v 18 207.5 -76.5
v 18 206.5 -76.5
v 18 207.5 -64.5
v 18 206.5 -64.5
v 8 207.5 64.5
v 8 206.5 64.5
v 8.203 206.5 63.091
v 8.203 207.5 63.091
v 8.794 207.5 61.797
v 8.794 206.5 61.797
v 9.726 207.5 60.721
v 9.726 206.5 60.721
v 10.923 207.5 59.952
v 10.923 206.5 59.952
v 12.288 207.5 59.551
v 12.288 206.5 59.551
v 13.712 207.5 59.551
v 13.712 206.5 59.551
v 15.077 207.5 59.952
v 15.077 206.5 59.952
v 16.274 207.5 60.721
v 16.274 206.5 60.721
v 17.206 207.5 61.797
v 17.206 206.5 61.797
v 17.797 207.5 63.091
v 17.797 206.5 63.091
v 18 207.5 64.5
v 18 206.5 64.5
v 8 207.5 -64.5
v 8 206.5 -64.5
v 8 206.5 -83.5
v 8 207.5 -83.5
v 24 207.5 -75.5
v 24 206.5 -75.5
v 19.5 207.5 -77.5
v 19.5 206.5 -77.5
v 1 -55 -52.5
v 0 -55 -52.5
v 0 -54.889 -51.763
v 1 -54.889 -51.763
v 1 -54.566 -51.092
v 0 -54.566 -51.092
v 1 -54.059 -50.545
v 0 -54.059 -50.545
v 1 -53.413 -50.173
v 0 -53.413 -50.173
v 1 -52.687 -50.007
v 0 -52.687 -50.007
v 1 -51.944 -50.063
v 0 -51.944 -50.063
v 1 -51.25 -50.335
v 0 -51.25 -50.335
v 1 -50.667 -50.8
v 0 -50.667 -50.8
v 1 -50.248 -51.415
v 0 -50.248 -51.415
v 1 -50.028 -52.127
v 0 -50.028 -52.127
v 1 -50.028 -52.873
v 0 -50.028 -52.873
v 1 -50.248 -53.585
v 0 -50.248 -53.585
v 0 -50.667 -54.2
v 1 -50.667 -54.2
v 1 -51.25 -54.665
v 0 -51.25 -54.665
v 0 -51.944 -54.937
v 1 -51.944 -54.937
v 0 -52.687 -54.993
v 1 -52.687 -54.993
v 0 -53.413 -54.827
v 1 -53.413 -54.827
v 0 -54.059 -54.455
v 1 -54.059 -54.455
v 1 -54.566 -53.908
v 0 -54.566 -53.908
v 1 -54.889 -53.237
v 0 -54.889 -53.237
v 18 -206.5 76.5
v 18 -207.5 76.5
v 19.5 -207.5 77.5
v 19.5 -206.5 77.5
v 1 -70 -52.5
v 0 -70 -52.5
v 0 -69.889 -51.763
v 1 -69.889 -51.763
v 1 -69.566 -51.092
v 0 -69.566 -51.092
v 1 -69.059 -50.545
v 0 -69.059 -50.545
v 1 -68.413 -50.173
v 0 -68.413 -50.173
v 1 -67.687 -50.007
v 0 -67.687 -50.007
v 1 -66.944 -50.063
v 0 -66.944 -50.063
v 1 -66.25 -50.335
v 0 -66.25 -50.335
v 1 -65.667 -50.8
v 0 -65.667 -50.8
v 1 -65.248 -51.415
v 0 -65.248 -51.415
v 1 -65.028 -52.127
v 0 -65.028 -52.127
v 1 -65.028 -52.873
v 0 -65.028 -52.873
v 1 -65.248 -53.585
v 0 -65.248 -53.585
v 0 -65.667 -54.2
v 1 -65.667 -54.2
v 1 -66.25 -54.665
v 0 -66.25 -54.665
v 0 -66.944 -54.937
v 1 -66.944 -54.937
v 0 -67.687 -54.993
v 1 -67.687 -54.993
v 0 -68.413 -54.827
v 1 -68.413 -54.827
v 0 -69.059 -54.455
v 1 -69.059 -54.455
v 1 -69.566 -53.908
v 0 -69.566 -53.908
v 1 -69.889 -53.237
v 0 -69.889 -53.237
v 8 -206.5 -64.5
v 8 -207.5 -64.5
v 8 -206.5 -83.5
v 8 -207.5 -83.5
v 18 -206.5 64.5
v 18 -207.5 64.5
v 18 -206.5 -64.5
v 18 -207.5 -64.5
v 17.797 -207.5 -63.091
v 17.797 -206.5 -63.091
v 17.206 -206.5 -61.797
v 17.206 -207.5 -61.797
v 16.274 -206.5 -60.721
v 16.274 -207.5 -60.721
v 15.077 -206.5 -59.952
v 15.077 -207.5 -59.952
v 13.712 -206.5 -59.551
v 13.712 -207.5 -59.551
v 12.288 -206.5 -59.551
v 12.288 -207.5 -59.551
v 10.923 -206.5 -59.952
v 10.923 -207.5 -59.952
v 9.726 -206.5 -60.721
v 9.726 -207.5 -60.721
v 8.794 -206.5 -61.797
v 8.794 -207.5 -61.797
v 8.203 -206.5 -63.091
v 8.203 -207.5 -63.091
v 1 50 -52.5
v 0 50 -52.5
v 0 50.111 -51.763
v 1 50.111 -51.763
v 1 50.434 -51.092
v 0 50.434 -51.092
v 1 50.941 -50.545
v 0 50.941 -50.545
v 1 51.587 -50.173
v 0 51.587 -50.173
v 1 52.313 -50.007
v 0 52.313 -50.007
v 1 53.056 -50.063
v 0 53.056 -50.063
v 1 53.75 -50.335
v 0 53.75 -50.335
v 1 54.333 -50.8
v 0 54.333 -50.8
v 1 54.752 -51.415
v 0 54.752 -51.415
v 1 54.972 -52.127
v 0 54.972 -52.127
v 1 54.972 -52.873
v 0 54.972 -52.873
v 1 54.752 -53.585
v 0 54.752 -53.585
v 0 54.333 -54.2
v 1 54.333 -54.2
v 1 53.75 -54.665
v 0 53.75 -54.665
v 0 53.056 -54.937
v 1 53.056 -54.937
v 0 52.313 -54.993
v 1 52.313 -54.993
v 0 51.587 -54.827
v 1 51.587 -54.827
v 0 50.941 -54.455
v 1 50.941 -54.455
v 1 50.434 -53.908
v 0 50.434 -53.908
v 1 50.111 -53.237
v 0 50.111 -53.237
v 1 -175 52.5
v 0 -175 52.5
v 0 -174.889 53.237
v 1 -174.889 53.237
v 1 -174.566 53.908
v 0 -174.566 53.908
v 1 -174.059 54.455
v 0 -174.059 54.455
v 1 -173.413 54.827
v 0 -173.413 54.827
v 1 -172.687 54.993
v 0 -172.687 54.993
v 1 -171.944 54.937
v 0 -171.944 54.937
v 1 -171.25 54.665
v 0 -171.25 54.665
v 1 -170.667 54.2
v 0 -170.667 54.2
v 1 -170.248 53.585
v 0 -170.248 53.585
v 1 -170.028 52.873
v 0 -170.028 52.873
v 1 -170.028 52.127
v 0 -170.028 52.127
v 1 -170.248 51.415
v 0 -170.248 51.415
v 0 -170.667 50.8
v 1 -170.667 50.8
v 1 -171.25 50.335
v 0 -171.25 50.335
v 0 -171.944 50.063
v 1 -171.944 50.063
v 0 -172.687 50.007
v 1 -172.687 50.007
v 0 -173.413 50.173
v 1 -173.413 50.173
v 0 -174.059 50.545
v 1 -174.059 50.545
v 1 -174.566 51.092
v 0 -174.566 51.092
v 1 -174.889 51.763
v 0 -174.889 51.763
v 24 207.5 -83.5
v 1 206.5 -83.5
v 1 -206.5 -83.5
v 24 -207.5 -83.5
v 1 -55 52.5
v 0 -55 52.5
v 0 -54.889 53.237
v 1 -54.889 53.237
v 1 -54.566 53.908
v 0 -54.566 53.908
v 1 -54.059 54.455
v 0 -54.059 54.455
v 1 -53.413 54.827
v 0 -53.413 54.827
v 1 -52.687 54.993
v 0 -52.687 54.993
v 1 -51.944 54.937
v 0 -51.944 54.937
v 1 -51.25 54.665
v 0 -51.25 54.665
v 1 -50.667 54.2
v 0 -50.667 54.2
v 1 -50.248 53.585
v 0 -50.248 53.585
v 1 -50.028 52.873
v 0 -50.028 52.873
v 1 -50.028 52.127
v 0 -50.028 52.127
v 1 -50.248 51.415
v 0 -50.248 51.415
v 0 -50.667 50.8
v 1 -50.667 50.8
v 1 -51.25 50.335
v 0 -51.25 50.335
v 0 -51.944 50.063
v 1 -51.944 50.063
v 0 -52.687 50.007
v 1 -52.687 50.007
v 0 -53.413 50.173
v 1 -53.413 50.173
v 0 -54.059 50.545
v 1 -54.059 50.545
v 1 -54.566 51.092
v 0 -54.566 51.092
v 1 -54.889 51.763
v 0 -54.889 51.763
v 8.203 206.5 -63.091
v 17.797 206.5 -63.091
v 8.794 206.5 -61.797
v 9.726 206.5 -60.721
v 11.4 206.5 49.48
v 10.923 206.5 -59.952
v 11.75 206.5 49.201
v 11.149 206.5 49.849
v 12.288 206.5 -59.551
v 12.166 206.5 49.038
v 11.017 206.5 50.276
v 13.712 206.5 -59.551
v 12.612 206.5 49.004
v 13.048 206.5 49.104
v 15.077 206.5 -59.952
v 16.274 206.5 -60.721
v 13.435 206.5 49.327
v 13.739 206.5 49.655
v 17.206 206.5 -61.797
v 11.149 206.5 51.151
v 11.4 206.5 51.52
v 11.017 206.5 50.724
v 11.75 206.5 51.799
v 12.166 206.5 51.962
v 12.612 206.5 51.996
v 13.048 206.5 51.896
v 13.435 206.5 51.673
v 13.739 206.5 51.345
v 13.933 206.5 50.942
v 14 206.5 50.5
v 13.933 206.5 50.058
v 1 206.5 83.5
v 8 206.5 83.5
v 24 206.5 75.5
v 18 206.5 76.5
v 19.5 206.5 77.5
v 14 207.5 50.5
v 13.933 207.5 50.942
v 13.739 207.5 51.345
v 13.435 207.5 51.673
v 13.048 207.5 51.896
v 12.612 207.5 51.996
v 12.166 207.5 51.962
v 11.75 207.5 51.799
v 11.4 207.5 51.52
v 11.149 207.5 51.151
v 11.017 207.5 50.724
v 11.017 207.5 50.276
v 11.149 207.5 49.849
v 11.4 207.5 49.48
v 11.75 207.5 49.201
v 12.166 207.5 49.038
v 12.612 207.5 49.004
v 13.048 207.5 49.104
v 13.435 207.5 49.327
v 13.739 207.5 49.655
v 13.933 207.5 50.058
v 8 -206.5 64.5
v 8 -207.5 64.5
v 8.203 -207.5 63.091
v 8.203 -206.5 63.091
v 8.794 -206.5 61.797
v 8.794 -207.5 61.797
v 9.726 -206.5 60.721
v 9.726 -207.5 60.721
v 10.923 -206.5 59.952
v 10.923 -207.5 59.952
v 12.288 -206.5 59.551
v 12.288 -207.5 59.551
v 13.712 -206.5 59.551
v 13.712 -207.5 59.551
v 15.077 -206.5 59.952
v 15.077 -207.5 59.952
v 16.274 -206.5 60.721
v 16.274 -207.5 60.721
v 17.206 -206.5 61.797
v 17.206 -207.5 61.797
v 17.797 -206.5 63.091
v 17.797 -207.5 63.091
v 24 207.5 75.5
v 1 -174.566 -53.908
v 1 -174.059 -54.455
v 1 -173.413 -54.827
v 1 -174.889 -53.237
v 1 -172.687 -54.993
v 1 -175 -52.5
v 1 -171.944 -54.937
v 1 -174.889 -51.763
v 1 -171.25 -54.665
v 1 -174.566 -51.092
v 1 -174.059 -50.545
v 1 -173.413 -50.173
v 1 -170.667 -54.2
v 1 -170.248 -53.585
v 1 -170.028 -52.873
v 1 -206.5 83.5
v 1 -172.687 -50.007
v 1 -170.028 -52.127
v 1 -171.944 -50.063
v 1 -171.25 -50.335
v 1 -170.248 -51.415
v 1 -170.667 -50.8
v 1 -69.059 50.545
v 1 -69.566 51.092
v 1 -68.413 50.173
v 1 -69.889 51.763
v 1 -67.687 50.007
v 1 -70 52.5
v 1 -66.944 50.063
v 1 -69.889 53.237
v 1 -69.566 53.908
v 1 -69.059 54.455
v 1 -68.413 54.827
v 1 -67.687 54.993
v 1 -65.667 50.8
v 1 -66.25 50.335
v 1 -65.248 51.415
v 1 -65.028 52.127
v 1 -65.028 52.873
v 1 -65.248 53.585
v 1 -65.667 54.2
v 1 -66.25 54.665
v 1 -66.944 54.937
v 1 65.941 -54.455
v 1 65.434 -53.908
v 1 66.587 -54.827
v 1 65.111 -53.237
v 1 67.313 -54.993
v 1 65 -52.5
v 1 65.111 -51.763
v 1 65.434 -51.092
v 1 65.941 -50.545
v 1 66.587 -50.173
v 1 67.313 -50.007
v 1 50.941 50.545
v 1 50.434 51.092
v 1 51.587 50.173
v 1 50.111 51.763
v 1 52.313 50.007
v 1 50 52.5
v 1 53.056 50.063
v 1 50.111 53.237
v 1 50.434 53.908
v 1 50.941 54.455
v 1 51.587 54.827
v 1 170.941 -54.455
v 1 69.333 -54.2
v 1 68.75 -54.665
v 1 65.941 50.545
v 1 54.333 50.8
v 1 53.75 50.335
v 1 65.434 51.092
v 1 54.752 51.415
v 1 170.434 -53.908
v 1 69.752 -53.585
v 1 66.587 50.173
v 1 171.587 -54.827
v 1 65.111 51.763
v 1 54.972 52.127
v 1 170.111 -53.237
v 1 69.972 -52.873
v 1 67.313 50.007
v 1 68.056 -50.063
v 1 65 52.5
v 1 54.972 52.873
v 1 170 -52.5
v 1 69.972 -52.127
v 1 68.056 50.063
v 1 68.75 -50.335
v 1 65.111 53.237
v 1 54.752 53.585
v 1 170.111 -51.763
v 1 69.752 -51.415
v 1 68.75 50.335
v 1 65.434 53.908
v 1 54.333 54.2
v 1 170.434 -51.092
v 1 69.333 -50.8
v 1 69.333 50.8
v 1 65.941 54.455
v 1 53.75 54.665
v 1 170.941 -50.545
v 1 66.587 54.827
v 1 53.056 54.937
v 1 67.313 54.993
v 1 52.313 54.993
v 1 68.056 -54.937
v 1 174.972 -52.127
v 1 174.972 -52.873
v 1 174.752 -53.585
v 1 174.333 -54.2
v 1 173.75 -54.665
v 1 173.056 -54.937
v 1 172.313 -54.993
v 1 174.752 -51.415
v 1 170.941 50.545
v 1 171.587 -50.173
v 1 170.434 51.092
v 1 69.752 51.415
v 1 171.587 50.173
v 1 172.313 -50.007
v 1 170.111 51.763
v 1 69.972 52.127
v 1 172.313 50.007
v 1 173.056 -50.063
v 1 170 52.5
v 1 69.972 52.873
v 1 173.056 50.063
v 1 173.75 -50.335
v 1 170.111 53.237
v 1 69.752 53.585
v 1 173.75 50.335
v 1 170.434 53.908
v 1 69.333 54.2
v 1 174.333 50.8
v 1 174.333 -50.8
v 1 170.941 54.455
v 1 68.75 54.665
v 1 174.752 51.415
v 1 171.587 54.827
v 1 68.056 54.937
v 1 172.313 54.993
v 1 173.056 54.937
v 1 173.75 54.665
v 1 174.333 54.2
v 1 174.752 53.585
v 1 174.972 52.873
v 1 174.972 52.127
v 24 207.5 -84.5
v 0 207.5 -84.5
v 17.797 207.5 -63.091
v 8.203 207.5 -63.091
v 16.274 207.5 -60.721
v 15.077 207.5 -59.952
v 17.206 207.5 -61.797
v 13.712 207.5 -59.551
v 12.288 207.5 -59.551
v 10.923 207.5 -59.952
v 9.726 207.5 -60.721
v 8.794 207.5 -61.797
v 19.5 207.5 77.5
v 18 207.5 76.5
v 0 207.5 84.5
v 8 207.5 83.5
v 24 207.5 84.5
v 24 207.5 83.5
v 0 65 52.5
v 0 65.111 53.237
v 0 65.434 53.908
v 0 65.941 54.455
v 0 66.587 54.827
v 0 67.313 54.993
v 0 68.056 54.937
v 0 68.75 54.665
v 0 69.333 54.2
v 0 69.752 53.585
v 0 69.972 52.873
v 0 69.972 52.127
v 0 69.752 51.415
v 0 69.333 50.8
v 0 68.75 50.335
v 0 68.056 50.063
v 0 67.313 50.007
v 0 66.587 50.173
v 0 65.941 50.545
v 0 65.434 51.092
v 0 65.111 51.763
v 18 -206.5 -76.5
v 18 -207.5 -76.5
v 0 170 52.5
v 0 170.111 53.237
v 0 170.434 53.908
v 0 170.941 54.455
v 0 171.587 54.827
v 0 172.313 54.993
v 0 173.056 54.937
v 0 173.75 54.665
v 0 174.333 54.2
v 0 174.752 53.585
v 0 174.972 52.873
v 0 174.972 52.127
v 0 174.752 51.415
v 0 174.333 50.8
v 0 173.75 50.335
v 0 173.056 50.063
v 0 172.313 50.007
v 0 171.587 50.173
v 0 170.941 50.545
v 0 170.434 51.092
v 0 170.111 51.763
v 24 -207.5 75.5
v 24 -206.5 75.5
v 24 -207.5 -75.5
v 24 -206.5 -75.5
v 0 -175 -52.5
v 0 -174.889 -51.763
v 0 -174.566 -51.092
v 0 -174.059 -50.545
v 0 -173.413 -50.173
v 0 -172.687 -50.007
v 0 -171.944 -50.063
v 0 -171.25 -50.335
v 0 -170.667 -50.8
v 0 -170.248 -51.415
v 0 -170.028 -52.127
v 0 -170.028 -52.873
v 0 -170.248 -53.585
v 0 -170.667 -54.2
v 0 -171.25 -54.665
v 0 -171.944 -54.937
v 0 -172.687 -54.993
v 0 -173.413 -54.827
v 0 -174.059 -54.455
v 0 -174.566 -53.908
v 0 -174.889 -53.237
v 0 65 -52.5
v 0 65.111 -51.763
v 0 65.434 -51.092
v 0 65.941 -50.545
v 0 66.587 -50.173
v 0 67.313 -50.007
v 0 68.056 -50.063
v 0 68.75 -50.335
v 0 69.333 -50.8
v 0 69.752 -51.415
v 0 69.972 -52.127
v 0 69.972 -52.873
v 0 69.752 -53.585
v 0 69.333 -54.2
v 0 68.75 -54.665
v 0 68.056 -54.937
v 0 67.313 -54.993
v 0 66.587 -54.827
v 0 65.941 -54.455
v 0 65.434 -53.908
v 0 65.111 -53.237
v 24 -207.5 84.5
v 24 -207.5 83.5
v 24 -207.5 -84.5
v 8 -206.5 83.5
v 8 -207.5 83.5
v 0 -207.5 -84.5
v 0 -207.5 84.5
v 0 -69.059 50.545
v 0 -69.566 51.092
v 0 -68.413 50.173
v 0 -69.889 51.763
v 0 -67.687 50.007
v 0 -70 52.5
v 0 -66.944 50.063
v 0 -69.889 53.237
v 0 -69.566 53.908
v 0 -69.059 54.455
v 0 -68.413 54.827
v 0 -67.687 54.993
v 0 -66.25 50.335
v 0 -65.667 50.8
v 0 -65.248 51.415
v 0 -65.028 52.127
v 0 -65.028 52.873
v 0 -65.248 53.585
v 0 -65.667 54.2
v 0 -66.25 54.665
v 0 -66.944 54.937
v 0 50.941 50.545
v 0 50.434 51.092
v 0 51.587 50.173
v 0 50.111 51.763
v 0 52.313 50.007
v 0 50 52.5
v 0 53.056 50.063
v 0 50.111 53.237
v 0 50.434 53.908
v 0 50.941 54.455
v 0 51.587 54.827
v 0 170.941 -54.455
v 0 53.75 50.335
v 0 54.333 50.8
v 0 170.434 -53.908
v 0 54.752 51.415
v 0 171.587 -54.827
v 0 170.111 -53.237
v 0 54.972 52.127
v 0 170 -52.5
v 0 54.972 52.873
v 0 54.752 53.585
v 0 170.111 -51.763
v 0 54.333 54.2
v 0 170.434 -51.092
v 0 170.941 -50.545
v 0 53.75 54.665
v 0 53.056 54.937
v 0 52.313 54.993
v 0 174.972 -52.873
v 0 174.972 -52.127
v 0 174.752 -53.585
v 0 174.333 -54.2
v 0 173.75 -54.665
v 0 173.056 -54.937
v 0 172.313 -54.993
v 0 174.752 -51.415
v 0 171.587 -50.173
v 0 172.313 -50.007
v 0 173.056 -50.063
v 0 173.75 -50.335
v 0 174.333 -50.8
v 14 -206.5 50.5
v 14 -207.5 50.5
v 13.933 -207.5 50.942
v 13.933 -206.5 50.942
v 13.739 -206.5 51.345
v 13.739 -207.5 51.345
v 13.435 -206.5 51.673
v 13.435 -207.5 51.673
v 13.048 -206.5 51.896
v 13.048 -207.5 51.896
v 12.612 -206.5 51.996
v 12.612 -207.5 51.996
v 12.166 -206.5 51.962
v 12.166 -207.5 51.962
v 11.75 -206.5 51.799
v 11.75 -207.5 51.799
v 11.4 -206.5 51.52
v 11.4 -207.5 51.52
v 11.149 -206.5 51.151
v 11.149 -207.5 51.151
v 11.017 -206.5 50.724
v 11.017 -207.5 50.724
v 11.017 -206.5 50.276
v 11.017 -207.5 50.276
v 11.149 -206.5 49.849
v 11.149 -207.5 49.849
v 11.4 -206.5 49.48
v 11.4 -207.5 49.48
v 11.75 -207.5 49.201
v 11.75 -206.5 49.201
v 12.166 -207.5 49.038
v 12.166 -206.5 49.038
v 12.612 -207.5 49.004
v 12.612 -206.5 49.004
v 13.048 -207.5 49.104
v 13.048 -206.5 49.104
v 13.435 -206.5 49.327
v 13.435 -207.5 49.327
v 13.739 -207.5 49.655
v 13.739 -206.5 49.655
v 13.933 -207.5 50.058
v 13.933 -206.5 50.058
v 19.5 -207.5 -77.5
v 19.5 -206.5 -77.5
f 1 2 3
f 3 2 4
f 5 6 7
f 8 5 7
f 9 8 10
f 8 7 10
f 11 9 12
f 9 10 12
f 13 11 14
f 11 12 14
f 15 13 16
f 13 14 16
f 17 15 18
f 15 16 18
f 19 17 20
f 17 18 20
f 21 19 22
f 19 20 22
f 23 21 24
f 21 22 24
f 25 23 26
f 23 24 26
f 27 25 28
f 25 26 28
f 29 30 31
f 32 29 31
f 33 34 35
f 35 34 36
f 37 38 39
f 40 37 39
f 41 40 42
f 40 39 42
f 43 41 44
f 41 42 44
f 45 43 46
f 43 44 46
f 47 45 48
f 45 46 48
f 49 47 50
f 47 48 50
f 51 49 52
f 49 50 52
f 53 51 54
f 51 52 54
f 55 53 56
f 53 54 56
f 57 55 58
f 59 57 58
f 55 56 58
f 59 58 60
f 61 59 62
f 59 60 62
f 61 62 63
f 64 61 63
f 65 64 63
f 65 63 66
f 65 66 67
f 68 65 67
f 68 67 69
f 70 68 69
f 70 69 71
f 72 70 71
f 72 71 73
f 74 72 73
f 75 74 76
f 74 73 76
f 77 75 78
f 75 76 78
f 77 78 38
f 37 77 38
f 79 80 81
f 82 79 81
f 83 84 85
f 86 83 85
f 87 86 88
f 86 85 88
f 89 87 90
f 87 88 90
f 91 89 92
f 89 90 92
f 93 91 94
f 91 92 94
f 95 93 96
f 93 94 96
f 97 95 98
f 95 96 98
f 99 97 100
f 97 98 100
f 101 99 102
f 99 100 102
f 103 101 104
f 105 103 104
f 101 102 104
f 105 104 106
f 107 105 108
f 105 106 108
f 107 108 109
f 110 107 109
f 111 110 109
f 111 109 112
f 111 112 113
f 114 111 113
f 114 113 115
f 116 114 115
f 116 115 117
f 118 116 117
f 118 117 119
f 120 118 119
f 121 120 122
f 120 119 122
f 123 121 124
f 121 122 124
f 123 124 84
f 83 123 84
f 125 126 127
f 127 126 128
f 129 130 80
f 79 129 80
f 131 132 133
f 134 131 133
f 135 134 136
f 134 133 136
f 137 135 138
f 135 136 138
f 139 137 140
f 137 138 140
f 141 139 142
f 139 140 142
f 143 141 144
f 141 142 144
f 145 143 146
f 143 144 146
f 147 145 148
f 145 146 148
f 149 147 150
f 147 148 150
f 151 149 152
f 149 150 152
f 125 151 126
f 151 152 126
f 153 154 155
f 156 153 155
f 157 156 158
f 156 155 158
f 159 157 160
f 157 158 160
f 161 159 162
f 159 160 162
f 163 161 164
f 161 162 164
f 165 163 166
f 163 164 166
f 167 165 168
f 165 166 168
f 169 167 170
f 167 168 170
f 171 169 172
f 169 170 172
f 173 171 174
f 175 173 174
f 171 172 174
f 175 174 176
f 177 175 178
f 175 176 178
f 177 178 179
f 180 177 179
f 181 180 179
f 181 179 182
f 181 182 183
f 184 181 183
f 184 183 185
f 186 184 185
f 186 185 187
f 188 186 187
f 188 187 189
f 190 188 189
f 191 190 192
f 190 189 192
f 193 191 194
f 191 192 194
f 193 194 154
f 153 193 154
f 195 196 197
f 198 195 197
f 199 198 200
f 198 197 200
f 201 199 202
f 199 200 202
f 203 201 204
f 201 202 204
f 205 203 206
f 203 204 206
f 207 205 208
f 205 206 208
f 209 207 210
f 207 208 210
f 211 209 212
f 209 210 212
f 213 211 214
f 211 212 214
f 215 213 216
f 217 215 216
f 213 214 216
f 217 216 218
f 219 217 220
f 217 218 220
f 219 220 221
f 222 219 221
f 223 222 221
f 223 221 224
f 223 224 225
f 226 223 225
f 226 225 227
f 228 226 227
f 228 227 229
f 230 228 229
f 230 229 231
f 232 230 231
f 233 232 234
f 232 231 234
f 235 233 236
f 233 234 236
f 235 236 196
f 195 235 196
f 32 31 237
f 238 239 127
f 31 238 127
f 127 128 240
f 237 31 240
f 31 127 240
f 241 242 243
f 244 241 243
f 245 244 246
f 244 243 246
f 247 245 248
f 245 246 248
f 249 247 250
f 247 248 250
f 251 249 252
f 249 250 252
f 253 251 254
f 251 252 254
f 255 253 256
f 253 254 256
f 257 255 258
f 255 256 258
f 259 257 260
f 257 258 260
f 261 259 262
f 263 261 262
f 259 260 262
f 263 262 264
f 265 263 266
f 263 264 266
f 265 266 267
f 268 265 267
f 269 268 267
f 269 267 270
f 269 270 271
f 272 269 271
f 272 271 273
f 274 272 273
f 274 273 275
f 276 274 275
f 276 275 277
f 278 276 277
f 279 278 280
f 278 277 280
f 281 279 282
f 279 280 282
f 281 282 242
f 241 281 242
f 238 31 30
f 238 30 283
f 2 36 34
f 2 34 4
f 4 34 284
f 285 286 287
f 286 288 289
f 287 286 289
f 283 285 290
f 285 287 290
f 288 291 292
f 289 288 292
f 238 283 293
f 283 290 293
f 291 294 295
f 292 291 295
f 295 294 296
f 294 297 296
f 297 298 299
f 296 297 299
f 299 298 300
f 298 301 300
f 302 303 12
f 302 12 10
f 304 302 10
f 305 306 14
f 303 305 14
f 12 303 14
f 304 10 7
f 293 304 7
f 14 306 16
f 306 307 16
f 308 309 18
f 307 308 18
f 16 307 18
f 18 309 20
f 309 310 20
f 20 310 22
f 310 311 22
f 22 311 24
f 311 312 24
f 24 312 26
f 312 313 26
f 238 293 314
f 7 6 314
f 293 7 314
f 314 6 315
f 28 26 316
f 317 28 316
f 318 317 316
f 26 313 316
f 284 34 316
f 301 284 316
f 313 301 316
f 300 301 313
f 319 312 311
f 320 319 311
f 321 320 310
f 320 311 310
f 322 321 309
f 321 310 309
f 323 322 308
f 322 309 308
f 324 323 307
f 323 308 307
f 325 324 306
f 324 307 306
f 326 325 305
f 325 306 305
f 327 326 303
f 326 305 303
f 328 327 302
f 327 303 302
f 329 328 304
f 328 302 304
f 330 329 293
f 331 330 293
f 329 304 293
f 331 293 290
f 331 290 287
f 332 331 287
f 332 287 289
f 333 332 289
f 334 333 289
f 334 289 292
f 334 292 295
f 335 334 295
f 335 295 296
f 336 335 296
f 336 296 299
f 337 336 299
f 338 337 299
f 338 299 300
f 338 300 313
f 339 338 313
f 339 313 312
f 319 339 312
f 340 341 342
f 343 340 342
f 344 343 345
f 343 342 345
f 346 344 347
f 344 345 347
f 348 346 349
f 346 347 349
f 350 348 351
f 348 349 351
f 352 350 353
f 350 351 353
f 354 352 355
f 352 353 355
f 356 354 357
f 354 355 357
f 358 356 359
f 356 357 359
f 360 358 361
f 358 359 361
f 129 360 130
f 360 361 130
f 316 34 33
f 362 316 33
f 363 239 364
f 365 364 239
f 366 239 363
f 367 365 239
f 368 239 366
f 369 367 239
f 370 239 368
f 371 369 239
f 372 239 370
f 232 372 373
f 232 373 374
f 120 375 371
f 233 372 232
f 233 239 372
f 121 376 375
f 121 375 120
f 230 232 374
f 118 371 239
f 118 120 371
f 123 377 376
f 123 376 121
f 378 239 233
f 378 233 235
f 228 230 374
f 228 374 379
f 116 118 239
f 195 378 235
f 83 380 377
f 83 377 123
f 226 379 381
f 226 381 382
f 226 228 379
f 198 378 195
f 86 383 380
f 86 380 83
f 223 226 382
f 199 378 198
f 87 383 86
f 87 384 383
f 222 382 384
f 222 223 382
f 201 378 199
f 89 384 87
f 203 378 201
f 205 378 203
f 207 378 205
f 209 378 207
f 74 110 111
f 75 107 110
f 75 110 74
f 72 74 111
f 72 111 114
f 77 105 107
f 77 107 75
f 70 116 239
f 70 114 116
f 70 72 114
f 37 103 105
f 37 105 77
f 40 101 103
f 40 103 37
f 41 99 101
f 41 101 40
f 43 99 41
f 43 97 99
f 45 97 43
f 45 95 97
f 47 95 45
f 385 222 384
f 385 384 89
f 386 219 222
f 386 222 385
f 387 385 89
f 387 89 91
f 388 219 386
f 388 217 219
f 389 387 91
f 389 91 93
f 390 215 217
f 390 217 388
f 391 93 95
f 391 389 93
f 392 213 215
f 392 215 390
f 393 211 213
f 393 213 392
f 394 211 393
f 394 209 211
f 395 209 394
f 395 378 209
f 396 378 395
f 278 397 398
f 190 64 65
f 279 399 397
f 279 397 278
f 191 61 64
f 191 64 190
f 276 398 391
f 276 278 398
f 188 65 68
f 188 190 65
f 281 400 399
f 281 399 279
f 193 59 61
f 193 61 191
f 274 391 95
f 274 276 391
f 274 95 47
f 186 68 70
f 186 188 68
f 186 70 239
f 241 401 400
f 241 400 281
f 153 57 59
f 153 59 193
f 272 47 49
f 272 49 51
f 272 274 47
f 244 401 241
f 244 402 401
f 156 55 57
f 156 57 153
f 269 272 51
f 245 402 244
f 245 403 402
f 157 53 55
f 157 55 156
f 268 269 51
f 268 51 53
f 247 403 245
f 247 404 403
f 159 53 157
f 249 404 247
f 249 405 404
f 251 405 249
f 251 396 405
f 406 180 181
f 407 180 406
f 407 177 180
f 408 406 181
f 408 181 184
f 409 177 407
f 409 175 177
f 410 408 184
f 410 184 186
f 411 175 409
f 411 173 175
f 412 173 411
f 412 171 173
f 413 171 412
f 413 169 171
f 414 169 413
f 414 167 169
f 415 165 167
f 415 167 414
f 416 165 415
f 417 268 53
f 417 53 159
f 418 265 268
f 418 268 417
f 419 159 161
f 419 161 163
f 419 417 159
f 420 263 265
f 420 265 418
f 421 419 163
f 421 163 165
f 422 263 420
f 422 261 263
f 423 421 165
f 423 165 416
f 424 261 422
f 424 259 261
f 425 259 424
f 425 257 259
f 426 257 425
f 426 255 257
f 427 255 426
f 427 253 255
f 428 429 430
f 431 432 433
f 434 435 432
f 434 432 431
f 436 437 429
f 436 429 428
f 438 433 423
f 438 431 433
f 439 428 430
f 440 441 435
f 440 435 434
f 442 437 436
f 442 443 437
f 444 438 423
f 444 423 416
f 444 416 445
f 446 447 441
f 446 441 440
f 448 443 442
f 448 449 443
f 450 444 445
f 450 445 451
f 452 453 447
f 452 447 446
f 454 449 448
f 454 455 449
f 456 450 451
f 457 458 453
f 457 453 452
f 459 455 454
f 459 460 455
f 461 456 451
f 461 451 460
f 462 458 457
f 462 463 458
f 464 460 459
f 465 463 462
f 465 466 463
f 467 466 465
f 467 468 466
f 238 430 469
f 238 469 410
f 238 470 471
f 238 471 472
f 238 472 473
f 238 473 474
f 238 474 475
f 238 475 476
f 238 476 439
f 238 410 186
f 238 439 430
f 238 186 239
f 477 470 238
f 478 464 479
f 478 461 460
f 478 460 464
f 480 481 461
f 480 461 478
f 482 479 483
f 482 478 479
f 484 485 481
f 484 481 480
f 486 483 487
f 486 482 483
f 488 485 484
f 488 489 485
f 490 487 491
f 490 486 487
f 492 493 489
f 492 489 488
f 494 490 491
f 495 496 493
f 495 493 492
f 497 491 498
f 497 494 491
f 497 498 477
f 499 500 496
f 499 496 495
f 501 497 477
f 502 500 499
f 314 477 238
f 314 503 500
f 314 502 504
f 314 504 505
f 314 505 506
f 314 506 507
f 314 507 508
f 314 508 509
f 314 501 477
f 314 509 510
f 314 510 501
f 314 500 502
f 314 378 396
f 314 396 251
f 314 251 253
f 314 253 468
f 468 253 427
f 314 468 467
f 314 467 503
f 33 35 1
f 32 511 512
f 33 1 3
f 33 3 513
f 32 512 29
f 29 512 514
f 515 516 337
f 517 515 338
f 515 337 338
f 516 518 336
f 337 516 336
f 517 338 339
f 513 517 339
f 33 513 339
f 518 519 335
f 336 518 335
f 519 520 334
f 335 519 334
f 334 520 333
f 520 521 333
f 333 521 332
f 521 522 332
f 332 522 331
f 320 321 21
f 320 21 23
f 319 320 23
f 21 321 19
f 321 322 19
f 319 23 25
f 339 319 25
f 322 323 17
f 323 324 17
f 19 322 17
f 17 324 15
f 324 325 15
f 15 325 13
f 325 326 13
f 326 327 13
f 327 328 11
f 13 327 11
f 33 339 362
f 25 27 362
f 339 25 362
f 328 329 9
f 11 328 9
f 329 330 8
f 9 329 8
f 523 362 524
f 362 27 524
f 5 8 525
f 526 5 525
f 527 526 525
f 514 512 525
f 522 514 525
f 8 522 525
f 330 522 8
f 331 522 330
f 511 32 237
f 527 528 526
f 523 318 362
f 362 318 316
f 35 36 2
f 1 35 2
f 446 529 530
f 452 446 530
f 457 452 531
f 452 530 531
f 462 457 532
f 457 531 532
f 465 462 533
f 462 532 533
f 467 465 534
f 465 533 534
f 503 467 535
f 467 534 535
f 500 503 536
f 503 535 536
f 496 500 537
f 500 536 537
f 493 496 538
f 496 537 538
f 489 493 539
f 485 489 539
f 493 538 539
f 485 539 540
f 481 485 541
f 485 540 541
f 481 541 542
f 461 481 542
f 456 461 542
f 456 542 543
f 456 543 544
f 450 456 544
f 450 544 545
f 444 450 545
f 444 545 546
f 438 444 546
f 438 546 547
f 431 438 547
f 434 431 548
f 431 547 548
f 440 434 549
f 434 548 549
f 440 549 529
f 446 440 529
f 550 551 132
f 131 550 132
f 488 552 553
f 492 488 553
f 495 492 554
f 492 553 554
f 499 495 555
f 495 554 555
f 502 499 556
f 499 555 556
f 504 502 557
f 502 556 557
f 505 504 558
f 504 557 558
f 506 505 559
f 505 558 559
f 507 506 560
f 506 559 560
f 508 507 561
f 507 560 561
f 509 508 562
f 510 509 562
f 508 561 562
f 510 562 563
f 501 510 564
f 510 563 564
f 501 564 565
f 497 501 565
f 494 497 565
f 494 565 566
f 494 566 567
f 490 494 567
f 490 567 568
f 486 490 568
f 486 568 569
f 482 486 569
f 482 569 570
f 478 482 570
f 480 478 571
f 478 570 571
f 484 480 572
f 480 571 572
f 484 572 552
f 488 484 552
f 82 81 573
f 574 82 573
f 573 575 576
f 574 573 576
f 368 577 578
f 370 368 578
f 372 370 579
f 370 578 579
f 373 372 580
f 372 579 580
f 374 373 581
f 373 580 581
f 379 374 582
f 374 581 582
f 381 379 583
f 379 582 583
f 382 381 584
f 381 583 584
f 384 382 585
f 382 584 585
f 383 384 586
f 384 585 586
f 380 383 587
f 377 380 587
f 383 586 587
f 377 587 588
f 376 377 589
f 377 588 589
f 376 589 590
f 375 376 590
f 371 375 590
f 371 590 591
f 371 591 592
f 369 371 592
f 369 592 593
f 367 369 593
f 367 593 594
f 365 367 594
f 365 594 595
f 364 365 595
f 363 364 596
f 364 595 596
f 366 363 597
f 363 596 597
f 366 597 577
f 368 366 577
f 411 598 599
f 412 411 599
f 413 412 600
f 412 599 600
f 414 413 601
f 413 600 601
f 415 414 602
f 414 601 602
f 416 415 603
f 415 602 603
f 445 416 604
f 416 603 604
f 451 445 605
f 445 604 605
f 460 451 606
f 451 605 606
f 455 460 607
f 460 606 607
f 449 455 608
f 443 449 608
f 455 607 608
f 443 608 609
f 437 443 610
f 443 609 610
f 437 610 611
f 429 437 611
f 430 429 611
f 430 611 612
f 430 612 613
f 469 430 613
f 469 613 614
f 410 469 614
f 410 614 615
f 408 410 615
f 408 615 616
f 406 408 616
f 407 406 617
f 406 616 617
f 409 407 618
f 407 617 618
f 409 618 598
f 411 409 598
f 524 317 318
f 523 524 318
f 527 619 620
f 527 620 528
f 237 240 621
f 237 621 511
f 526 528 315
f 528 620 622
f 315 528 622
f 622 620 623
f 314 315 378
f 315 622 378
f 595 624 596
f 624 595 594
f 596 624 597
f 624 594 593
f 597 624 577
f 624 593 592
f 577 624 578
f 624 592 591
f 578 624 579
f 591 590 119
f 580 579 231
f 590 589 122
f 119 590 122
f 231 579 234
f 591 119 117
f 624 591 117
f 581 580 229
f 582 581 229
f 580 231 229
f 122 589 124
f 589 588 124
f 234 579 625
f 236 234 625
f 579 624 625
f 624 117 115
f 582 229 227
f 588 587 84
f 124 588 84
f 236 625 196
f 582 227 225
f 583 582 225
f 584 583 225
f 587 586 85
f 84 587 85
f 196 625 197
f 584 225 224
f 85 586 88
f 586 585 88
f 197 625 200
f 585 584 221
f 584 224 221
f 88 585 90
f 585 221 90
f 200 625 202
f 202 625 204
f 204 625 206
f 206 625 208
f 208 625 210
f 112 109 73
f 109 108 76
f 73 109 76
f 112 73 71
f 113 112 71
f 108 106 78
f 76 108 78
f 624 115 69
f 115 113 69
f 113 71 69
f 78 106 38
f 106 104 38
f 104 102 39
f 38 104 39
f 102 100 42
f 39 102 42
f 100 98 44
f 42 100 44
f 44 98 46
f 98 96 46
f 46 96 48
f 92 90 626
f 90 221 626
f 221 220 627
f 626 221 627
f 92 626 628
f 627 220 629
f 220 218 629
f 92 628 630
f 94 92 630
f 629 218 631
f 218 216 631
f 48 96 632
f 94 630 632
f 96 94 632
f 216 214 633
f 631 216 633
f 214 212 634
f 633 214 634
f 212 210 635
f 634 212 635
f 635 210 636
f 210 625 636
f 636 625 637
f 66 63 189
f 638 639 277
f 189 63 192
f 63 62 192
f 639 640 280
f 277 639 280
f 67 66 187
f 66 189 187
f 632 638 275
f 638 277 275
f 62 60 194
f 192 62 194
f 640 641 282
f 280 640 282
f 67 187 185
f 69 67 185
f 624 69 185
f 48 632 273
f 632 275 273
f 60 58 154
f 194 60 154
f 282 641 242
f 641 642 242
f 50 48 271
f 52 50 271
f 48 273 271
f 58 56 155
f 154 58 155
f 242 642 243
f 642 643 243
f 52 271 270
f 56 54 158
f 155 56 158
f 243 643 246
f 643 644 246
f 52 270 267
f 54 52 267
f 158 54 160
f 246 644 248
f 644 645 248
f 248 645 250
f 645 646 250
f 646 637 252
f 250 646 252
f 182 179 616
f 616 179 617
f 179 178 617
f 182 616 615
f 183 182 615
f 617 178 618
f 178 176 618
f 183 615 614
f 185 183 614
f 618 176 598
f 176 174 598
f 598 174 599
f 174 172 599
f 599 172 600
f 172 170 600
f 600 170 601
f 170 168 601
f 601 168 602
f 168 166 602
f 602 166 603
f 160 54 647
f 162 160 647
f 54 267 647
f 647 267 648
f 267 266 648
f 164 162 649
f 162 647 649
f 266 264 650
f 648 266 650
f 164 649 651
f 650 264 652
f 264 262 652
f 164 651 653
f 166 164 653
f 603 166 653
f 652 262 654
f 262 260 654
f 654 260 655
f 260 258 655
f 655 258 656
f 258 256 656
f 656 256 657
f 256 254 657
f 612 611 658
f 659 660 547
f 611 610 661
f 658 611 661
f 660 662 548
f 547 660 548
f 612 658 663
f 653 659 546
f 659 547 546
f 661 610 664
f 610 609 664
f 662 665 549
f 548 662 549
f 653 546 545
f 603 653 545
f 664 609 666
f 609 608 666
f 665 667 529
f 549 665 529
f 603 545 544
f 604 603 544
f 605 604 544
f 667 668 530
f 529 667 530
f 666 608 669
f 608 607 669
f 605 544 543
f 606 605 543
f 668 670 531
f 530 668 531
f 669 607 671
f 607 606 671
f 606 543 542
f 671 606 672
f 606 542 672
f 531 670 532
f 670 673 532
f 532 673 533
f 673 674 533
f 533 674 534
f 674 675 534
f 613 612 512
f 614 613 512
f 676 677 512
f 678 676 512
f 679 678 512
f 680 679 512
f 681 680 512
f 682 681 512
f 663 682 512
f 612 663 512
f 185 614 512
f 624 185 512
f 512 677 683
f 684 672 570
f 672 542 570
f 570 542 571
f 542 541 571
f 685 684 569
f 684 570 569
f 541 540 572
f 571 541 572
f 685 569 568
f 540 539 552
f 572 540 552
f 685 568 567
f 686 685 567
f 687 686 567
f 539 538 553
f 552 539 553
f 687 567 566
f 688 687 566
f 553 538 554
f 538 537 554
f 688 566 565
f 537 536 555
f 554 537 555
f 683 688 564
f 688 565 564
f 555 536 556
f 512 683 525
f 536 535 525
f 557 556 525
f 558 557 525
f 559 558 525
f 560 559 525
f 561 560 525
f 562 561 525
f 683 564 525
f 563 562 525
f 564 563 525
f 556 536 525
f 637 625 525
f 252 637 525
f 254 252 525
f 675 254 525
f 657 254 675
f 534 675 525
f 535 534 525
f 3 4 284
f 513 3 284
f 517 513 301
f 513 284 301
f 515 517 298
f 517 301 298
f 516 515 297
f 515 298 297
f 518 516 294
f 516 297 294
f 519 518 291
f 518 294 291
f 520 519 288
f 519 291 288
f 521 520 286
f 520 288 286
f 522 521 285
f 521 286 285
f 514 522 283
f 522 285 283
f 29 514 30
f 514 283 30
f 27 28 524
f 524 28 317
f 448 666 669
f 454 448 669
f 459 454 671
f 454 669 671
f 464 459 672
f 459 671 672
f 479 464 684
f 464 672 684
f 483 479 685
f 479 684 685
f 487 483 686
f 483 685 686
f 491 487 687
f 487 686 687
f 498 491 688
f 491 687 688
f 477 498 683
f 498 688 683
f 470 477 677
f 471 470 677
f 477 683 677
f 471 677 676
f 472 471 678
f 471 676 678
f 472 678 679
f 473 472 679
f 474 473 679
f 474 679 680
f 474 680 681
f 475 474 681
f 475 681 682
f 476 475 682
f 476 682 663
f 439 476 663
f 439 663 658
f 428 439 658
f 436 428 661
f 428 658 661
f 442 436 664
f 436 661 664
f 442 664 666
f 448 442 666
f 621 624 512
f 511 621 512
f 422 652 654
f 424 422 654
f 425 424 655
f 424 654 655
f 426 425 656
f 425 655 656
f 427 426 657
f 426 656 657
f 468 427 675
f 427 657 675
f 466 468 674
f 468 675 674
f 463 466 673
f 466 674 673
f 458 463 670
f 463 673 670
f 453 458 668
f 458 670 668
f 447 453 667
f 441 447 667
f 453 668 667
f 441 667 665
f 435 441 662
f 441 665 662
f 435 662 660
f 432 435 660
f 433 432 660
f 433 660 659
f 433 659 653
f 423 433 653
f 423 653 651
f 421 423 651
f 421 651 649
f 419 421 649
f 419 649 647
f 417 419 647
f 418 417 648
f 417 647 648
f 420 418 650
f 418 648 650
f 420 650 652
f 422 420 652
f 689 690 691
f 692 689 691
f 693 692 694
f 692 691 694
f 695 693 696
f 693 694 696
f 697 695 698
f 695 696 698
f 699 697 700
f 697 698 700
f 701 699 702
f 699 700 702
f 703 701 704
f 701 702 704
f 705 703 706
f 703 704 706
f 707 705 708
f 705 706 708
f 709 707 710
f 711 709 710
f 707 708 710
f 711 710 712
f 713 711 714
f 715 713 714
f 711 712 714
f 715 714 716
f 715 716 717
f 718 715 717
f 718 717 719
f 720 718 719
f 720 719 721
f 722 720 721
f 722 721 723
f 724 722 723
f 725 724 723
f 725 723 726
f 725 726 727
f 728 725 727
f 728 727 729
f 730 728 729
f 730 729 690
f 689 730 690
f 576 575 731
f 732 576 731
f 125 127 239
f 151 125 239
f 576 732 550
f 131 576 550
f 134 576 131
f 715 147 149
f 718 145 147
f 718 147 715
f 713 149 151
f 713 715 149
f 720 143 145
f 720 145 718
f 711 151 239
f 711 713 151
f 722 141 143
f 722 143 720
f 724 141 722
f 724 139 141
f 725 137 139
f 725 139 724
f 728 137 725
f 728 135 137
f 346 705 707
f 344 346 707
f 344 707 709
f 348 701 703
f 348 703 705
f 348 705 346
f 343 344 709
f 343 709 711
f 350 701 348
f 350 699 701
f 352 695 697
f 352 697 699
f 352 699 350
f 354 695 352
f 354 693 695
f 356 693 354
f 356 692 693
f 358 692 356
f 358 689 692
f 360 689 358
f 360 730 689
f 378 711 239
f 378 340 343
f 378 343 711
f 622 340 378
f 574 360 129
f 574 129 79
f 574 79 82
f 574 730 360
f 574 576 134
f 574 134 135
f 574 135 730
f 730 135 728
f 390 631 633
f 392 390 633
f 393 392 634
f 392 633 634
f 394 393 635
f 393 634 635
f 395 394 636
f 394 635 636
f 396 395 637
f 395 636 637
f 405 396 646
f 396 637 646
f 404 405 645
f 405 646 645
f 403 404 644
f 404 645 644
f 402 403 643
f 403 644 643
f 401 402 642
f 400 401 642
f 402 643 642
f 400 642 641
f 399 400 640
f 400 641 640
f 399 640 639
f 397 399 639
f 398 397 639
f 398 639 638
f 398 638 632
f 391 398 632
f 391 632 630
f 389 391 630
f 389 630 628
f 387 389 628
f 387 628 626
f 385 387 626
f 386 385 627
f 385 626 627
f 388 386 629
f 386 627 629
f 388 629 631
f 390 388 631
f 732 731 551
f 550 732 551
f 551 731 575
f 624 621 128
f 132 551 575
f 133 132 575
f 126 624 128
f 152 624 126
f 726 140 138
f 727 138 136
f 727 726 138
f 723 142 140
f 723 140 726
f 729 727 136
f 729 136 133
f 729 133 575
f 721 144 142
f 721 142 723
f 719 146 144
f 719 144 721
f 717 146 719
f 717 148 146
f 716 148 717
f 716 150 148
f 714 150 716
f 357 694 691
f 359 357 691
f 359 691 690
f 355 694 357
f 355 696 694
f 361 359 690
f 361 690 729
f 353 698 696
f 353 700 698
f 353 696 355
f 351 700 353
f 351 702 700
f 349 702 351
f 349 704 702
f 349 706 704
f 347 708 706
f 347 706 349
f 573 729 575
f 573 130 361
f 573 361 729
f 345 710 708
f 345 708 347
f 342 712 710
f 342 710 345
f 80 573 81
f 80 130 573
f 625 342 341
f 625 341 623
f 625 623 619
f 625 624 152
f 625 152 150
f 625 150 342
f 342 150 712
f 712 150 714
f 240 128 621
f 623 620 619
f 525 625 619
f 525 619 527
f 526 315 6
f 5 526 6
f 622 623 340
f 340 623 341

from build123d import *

# Parameters (mm, degrees)
F0_W     = 415
F0_H     = 169
F1_DEPTH = 24
F2_W     = 413
F2_H     = 167
F3_DEPTH = 23
F5_DEPTH = 415.001
F6_R     = 1.5
F7_DEPTH = 415.001
F8_R     = 2.5
F9_DEPTH = 1


with BuildPart() as f1:
    # F0 (on Right) → F1 (new body)
    with BuildSketch(Plane.YZ):
        Rectangle(F0_W, F0_H)
    extrude(amount=F1_DEPTH)

    # F2 (on face) → F3 (cut)
    with BuildSketch(Plane.YZ.offset(24)):
        Rectangle(F2_W, F2_H)
    extrude(amount=-F3_DEPTH, mode=Mode.SUBTRACT)

    # F4 (on face) → F5 (cut, through all)
    with BuildSketch(Plane.XZ.offset(207.5)):
        with BuildLine():
            Line((8, -83.5), (24, -83.5))
            Line((24, -83.5), (24, -75.5))
            Line((24, -75.5), (19.5, -77.5))
            Line((19.5, -77.5), (18, -76.5))
            Line((18, -76.5), (18, -64.5))
            ThreePointArc((18, -64.5), (13, -59.5), (8, -64.5))
            Line((8, -64.5), (8, -83.5))
        make_face()
        with BuildLine():
            Line((18, 64.5), (18, 76.5))
            Line((18, 76.5), (19.5, 77.5))
            Line((19.5, 77.5), (24, 75.5))
            Line((24, 75.5), (24, 83.5))
            Line((24, 83.5), (8, 83.5))
            Line((8, 83.5), (8, 64.5))
            ThreePointArc((8, 64.5), (13, 59.5), (18, 64.5))
        make_face()
    extrude(amount=-F5_DEPTH, mode=Mode.SUBTRACT)

    # F6 (on face) → F7 (cut, through all)
    with BuildSketch(Plane.XZ.offset(207.5)):
        with Locations((12.5, 50.5)):
            Circle(F6_R)
    extrude(amount=-F7_DEPTH, mode=Mode.SUBTRACT)

    # F8 (on face) → F9 (cut, through all)
    with BuildSketch(Plane(origin=(0, 0, 0), x_dir=(0, -1, 0), z_dir=(-1, 0, 0))):
        with Locations((-172.5, 52.5)):
            Circle(F8_R)
        with Locations((-67.5, 52.5)):
            Circle(F8_R)
        with Locations((-52.5, 52.5)):
            Circle(F8_R)
        with Locations((-67.5, -52.5)):
            Circle(F8_R)
        with Locations((-172.5, -52.5)):
            Circle(F8_R)
        with Locations((-52.5, -52.5)):
            Circle(F8_R)
        with Locations((67.5, -52.5)):
            Circle(F8_R)
        with Locations((52.5, 52.5)):
            Circle(F8_R)
        with Locations((67.5, 52.5)):
            Circle(F8_R)
        with Locations((172.5, 52.5)):
            Circle(F8_R)
        with Locations((172.5, -52.5)):
            Circle(F8_R)
        with Locations((52.5, -52.5)):
            Circle(F8_R)
    extrude(amount=-F9_DEPTH, mode=Mode.SUBTRACT)


solid = f1.part
